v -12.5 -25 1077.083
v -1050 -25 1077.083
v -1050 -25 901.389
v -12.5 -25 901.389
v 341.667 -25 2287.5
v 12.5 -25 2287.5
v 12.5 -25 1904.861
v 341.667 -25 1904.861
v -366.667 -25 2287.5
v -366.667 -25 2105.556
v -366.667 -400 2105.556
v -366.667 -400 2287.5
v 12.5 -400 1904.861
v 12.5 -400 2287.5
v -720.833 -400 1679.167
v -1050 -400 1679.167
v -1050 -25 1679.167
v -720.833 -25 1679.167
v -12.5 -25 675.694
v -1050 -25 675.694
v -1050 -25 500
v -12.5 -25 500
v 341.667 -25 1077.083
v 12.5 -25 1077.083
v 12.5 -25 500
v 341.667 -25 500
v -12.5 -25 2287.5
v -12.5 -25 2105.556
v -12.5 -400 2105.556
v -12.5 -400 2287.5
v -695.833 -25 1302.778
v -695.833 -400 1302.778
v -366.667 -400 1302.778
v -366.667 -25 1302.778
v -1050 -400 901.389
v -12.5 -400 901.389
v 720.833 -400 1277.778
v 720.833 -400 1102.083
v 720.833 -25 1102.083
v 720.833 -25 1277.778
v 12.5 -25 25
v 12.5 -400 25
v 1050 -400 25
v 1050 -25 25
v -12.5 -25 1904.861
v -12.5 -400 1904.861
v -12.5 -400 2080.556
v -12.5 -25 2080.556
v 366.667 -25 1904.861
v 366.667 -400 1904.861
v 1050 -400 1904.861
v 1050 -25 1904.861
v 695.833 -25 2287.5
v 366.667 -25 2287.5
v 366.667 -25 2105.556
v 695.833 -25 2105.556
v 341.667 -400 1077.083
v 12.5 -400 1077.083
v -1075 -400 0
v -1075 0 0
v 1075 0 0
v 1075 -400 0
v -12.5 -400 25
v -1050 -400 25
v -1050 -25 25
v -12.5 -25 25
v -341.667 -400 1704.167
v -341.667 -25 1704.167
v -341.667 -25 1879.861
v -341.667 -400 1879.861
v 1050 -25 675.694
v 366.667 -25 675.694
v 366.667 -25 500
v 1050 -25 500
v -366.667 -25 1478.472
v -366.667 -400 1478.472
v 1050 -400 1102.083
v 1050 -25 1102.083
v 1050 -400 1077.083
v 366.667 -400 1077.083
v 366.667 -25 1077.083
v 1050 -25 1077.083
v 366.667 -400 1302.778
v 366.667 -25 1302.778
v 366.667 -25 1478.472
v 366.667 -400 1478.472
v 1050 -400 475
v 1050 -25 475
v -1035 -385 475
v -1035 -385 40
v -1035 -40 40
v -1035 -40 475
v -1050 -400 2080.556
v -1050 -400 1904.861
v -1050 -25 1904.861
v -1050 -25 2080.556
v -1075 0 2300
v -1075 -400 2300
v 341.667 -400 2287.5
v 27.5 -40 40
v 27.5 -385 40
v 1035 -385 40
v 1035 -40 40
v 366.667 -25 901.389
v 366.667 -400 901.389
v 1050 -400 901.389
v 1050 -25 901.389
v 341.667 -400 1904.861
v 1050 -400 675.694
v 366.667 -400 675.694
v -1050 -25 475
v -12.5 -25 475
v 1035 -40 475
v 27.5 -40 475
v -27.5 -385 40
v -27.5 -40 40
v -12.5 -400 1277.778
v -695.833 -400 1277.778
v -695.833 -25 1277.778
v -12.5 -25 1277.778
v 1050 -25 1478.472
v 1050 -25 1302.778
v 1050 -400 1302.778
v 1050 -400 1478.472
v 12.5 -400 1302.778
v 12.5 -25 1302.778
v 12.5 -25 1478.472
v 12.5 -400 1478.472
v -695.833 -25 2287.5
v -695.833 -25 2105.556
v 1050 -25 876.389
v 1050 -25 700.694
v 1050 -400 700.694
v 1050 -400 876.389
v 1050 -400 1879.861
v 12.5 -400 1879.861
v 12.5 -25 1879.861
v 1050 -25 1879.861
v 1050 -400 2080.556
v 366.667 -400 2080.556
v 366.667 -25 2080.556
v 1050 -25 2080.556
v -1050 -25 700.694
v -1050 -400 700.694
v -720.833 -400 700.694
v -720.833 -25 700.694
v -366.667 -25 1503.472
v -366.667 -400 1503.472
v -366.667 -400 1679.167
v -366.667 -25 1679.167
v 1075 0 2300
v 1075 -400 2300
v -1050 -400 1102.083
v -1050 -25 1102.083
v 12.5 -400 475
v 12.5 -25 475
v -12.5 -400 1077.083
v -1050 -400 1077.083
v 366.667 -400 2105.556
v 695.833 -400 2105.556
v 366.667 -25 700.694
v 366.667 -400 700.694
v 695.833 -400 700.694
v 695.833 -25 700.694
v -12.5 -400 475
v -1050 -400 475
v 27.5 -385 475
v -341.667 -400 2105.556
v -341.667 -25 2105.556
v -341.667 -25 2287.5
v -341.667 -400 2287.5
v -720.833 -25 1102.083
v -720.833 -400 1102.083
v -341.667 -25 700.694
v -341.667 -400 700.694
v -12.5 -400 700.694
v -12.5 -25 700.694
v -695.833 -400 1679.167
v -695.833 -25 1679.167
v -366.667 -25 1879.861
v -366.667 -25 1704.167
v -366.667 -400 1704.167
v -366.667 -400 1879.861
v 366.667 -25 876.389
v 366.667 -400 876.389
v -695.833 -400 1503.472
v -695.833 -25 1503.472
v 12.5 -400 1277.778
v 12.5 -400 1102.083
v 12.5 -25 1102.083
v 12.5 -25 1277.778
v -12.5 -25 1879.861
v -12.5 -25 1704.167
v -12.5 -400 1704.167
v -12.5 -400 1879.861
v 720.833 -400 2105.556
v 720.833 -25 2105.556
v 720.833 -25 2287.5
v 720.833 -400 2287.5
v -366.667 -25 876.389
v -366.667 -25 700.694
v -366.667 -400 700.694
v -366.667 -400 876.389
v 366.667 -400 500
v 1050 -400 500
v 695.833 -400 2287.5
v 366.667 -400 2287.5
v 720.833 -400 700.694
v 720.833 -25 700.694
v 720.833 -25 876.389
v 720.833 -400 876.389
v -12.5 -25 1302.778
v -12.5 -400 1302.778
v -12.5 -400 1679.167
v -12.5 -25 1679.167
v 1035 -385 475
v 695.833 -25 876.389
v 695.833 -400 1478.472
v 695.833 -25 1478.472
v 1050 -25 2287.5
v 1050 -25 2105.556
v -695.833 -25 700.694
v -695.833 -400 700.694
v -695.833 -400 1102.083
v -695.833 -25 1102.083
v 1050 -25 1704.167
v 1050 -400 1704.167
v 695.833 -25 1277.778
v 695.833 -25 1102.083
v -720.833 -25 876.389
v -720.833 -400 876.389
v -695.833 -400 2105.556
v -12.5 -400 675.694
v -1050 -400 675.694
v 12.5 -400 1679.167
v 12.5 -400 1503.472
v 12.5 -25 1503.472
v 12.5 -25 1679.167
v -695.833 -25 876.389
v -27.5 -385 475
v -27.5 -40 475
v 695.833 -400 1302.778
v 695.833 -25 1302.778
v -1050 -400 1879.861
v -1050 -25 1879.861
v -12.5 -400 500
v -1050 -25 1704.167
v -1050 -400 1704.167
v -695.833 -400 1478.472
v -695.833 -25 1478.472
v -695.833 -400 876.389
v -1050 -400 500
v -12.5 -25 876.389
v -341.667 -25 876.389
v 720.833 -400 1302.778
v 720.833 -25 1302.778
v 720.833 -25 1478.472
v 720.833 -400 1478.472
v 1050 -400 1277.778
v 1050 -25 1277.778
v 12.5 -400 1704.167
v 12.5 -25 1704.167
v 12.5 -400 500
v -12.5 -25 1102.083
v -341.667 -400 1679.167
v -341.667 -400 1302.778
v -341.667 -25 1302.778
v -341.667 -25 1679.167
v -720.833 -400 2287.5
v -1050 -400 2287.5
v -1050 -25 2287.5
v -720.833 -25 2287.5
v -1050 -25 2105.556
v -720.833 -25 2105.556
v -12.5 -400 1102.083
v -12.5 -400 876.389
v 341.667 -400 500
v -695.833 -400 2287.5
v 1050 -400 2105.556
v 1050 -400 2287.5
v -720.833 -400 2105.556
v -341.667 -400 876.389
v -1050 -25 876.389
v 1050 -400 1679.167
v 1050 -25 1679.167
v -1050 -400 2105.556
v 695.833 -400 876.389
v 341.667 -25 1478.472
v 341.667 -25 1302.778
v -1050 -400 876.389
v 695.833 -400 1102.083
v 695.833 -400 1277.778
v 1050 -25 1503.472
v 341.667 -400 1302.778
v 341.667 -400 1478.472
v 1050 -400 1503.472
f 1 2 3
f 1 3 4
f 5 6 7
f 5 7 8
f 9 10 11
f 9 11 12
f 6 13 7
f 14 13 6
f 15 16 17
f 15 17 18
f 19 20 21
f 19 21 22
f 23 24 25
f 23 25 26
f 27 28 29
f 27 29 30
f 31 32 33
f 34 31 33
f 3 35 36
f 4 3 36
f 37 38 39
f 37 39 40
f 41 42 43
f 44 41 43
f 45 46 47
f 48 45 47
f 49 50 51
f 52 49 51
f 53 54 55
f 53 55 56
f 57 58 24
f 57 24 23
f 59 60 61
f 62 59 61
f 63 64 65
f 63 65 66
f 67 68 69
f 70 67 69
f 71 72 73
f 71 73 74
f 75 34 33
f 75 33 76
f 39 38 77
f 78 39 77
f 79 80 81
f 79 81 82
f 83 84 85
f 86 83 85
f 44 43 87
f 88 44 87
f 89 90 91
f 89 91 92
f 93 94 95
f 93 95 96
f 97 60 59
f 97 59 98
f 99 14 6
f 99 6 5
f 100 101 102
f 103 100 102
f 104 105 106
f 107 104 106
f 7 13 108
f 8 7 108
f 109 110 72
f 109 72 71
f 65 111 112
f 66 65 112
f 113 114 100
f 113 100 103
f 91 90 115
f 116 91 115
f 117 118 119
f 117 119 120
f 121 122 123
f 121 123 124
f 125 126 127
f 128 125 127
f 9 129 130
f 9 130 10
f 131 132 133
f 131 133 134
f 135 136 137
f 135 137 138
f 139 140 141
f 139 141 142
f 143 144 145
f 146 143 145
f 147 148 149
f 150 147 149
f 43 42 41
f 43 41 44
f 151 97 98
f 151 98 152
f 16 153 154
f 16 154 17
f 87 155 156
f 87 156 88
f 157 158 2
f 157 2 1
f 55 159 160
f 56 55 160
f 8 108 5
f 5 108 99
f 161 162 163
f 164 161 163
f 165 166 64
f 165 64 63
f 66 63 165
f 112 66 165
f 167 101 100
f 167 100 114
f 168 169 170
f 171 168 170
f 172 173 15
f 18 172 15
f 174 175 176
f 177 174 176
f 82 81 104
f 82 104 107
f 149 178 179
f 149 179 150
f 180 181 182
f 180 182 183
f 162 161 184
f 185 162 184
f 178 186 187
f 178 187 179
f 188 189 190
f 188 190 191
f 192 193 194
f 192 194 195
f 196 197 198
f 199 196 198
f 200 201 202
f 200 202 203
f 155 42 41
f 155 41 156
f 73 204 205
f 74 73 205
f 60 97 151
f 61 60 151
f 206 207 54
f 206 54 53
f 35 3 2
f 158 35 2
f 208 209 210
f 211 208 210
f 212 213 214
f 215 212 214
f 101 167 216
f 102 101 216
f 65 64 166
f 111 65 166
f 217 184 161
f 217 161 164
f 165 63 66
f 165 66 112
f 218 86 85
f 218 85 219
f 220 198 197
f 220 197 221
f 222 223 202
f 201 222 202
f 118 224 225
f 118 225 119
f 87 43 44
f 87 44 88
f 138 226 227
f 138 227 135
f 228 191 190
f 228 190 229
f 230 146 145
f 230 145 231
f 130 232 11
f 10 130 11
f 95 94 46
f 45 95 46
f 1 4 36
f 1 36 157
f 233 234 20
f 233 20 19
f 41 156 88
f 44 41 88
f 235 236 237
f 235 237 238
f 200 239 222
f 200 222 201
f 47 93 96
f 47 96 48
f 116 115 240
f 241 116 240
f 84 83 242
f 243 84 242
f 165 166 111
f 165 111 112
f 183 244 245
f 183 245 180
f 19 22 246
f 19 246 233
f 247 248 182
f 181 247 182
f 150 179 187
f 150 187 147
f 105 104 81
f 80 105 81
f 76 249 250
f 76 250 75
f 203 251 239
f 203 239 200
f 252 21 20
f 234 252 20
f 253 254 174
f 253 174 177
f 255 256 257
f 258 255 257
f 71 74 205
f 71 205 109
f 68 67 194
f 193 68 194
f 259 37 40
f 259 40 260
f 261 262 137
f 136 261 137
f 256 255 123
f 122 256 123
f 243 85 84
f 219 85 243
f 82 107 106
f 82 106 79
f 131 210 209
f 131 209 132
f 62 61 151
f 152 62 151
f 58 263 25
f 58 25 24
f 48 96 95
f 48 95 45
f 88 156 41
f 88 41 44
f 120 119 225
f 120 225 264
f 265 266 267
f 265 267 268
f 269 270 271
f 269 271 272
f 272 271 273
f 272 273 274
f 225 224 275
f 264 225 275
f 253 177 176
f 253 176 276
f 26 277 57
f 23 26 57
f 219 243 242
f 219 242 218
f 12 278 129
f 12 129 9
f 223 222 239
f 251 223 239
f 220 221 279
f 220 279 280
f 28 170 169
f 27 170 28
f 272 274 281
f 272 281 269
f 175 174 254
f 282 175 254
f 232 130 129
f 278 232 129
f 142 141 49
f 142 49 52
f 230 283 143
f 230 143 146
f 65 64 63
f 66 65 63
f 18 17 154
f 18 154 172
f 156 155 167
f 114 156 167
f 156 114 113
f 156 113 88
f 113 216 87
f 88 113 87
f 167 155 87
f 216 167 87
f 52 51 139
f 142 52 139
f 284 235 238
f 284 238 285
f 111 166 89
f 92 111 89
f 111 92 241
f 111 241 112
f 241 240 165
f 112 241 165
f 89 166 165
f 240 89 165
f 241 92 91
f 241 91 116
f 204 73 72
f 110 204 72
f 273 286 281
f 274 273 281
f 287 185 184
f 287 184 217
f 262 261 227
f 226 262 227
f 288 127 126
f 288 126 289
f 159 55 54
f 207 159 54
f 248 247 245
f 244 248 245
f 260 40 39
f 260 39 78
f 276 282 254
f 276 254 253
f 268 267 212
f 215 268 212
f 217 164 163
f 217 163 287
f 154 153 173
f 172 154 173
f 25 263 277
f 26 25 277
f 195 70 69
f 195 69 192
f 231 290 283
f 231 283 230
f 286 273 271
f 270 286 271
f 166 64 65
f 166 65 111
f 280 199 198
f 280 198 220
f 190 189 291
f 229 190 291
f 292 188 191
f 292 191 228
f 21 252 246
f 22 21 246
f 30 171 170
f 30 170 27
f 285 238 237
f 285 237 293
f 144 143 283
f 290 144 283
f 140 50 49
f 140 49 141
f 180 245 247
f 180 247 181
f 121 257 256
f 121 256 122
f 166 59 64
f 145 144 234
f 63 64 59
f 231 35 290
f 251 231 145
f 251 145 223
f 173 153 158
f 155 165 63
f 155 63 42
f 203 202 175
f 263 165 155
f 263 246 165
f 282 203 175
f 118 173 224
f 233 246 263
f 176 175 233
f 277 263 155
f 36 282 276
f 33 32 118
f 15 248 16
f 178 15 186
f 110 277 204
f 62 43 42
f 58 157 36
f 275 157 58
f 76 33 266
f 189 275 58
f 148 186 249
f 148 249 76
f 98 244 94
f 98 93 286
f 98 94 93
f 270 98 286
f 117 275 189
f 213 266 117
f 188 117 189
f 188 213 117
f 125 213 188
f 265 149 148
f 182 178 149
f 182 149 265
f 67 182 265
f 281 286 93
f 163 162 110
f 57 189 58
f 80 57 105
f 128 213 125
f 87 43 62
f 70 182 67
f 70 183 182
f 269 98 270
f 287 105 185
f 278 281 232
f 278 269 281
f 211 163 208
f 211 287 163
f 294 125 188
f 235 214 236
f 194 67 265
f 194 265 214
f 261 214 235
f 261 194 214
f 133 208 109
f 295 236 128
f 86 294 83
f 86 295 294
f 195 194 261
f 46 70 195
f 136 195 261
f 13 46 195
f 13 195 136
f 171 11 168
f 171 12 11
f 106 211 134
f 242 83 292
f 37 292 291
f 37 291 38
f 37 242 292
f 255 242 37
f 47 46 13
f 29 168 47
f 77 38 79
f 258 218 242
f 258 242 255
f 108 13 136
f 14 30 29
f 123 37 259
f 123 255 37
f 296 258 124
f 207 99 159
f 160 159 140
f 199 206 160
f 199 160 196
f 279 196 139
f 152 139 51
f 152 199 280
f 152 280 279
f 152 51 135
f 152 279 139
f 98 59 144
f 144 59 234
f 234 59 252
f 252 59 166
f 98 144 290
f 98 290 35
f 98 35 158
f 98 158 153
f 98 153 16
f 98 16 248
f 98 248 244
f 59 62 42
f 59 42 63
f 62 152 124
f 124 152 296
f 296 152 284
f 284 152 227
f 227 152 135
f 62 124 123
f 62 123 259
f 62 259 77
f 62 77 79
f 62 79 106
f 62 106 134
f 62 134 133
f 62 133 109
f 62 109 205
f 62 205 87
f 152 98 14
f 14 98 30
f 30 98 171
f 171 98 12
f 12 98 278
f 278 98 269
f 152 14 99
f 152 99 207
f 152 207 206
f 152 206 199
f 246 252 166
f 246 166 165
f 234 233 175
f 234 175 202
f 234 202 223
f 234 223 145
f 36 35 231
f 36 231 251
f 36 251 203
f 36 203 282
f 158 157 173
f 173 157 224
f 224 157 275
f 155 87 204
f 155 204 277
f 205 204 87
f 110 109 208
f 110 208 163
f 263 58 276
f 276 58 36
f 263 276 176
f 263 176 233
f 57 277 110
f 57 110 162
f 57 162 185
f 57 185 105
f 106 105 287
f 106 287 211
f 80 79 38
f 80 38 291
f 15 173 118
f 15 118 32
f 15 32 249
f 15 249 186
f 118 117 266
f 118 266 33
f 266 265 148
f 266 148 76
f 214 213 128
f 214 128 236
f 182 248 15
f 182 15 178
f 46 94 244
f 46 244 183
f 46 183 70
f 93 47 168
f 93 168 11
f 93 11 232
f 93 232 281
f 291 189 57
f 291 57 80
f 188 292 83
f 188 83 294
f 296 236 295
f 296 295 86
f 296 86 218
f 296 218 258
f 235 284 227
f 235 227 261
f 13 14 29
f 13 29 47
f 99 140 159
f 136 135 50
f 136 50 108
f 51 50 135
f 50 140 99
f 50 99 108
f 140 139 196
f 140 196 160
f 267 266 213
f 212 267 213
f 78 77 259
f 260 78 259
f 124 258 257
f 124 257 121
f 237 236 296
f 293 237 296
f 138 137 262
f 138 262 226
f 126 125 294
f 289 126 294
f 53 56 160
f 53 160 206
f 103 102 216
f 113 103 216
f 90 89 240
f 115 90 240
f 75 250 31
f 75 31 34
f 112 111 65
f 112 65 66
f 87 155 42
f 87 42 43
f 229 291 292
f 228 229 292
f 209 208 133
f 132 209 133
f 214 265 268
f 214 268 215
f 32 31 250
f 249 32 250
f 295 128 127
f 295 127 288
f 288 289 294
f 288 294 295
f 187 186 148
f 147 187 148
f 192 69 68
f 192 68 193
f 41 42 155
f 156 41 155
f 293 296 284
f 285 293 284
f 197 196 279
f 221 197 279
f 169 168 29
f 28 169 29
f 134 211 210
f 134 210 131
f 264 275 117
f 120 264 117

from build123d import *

# Parameters (mm, degrees)
F0_W     = 2150
F0_H     = 2300
F1_DEPTH = 400
F2_W     = 329.1666666667
F2_H     = 181.9444444444
F2_H_2   = 382.6388888889
F2_W_2   = 1037.5
F2_H_3   = 175.6944444444
F2_W_3   = 683.3333333333
F2_H_4   = 577.0833333333
F2_H_5   = 376.3888888889
F2_H_6   = 450
F3_DEPTH = 375
F4_DEPTH = 375
F5_T     = -15
F5_2_T   = -15


with BuildPart() as f1:
    # F0 (on Front) → F1 (new body)
    with BuildSketch(Plane.XZ):
        with Locations((0, 1150)):
            Rectangle(F0_W, F0_H)
    extrude(amount=F1_DEPTH)

    # F2 (on face) → F3 (cut, through all)
    with BuildSketch(Plane.XZ.offset(400)):
        with Locations((-885.4166666667, 2196.5277777778)):
            Rectangle(F2_W, F2_H)
        with Locations((-531.25, 2196.5277777778)):
            Rectangle(F2_W, F2_H)
        with Locations((-177.0833333333, 2196.5277777778)):
            Rectangle(F2_W, F2_H)
        with Locations((177.0833333333, 2096.1805555556)):
            Rectangle(F2_W, F2_H_2)
        with Locations((531.25, 2196.5277777778)):
            Rectangle(F2_W, F2_H)
        with Locations((885.4166666667, 2196.5277777778)):
            Rectangle(F2_W, F2_H)
        with Locations((-531.25, 1992.7083333333)):
            Rectangle(F2_W_2, F2_H_3)
        with Locations((708.3333333333, 1992.7083333333)):
            Rectangle(F2_W_3, F2_H_3)
        with Locations((-708.3333333333, 1792.0138888889)):
            Rectangle(F2_W_3, F2_H_3)
        with Locations((-177.0833333333, 1792.0138888889)):
            Rectangle(F2_W, F2_H_3)
        with Locations((531.25, 1792.0138888889)):
            Rectangle(F2_W_2, F2_H_3)
        with Locations((-885.4166666667, 1390.625)):
            Rectangle(F2_W, F2_H_4)
        with Locations((-531.25, 1591.3194444444)):
            Rectangle(F2_W, F2_H_3)
        with Locations((-531.25, 1390.625)):
            Rectangle(F2_W, F2_H_3)
        with Locations((-354.1666666667, 1189.9305555556)):
            Rectangle(F2_W_3, F2_H_3)
        with Locations((-177.0833333333, 1490.9722222222)):
            Rectangle(F2_W, F2_H_5)
        with Locations((531.25, 1591.3194444444)):
            Rectangle(F2_W_2, F2_H_3)
        with Locations((177.0833333333, 1390.625)):
            Rectangle(F2_W, F2_H_3)
        with Locations((531.25, 1390.625)):
            Rectangle(F2_W, F2_H_3)
        with Locations((885.4166666667, 1390.625)):
            Rectangle(F2_W, F2_H_3)
        with Locations((354.1666666667, 1189.9305555556)):
            Rectangle(F2_W_3, F2_H_3)
        with Locations((885.4166666667, 1189.9305555556)):
            Rectangle(F2_W, F2_H_3)
        with Locations((-531.25, 989.2361111111)):
            Rectangle(F2_W_2, F2_H_3)
        with Locations((-885.4166666667, 788.5416666667)):
            Rectangle(F2_W, F2_H_3)
        with Locations((-531.25, 788.5416666667)):
            Rectangle(F2_W, F2_H_3)
        with Locations((-177.0833333333, 788.5416666667)):
            Rectangle(F2_W, F2_H_3)
        with Locations((-531.25, 587.8472222222)):
            Rectangle(F2_W_2, F2_H_3)
        with Locations((177.0833333333, 788.5416666667)):
            Rectangle(F2_W, F2_H_4)
        with Locations((708.3333333333, 989.2361111111)):
            Rectangle(F2_W_3, F2_H_3)
        with Locations((531.25, 788.5416666667)):
            Rectangle(F2_W, F2_H_3)
        with Locations((885.4166666667, 788.5416666667)):
            Rectangle(F2_W, F2_H_3)
        with Locations((708.3333333333, 587.8472222222)):
            Rectangle(F2_W_3, F2_H_3)
        with Locations((-531.25, 250)):
            Rectangle(F2_W_2, F2_H_6)
        with Locations((531.25, 250)):
            Rectangle(F2_W_2, F2_H_6)
    extrude(amount=-F3_DEPTH, mode=Mode.SUBTRACT)


with BuildPart() as f4:
    # F2 (on face) → F4 (new body, through all)
    with BuildSketch(Plane.XZ.offset(400)):
        with Locations((-531.25, 250)):
            Rectangle(F2_W_2, F2_H_6)
    extrude(amount=-F4_DEPTH)

    # F5
    f5_openings = [f4.faces().sort_by_distance(p)[0] for p in [
        (-531.25, -212.5, 475),
    ]]
    offset(amount=F5_T, openings=f5_openings)


with BuildPart() as f4b:
    # F2 (on face) → F4, piece 2 (new body, through all)
    with BuildSketch(Plane.XZ.offset(400)):
        with Locations((531.25, 250)):
            Rectangle(F2_W_2, F2_H_6)
    extrude(amount=-F4_DEPTH)

    # F5#2
    f5_2_openings = [f4b.faces().sort_by_distance(p)[0] for p in [
        (531.25, -212.5, 475),
    ]]
    offset(amount=F5_2_T, openings=f5_2_openings)


solid = Compound([f1.part, f4.part, f4b.part])
